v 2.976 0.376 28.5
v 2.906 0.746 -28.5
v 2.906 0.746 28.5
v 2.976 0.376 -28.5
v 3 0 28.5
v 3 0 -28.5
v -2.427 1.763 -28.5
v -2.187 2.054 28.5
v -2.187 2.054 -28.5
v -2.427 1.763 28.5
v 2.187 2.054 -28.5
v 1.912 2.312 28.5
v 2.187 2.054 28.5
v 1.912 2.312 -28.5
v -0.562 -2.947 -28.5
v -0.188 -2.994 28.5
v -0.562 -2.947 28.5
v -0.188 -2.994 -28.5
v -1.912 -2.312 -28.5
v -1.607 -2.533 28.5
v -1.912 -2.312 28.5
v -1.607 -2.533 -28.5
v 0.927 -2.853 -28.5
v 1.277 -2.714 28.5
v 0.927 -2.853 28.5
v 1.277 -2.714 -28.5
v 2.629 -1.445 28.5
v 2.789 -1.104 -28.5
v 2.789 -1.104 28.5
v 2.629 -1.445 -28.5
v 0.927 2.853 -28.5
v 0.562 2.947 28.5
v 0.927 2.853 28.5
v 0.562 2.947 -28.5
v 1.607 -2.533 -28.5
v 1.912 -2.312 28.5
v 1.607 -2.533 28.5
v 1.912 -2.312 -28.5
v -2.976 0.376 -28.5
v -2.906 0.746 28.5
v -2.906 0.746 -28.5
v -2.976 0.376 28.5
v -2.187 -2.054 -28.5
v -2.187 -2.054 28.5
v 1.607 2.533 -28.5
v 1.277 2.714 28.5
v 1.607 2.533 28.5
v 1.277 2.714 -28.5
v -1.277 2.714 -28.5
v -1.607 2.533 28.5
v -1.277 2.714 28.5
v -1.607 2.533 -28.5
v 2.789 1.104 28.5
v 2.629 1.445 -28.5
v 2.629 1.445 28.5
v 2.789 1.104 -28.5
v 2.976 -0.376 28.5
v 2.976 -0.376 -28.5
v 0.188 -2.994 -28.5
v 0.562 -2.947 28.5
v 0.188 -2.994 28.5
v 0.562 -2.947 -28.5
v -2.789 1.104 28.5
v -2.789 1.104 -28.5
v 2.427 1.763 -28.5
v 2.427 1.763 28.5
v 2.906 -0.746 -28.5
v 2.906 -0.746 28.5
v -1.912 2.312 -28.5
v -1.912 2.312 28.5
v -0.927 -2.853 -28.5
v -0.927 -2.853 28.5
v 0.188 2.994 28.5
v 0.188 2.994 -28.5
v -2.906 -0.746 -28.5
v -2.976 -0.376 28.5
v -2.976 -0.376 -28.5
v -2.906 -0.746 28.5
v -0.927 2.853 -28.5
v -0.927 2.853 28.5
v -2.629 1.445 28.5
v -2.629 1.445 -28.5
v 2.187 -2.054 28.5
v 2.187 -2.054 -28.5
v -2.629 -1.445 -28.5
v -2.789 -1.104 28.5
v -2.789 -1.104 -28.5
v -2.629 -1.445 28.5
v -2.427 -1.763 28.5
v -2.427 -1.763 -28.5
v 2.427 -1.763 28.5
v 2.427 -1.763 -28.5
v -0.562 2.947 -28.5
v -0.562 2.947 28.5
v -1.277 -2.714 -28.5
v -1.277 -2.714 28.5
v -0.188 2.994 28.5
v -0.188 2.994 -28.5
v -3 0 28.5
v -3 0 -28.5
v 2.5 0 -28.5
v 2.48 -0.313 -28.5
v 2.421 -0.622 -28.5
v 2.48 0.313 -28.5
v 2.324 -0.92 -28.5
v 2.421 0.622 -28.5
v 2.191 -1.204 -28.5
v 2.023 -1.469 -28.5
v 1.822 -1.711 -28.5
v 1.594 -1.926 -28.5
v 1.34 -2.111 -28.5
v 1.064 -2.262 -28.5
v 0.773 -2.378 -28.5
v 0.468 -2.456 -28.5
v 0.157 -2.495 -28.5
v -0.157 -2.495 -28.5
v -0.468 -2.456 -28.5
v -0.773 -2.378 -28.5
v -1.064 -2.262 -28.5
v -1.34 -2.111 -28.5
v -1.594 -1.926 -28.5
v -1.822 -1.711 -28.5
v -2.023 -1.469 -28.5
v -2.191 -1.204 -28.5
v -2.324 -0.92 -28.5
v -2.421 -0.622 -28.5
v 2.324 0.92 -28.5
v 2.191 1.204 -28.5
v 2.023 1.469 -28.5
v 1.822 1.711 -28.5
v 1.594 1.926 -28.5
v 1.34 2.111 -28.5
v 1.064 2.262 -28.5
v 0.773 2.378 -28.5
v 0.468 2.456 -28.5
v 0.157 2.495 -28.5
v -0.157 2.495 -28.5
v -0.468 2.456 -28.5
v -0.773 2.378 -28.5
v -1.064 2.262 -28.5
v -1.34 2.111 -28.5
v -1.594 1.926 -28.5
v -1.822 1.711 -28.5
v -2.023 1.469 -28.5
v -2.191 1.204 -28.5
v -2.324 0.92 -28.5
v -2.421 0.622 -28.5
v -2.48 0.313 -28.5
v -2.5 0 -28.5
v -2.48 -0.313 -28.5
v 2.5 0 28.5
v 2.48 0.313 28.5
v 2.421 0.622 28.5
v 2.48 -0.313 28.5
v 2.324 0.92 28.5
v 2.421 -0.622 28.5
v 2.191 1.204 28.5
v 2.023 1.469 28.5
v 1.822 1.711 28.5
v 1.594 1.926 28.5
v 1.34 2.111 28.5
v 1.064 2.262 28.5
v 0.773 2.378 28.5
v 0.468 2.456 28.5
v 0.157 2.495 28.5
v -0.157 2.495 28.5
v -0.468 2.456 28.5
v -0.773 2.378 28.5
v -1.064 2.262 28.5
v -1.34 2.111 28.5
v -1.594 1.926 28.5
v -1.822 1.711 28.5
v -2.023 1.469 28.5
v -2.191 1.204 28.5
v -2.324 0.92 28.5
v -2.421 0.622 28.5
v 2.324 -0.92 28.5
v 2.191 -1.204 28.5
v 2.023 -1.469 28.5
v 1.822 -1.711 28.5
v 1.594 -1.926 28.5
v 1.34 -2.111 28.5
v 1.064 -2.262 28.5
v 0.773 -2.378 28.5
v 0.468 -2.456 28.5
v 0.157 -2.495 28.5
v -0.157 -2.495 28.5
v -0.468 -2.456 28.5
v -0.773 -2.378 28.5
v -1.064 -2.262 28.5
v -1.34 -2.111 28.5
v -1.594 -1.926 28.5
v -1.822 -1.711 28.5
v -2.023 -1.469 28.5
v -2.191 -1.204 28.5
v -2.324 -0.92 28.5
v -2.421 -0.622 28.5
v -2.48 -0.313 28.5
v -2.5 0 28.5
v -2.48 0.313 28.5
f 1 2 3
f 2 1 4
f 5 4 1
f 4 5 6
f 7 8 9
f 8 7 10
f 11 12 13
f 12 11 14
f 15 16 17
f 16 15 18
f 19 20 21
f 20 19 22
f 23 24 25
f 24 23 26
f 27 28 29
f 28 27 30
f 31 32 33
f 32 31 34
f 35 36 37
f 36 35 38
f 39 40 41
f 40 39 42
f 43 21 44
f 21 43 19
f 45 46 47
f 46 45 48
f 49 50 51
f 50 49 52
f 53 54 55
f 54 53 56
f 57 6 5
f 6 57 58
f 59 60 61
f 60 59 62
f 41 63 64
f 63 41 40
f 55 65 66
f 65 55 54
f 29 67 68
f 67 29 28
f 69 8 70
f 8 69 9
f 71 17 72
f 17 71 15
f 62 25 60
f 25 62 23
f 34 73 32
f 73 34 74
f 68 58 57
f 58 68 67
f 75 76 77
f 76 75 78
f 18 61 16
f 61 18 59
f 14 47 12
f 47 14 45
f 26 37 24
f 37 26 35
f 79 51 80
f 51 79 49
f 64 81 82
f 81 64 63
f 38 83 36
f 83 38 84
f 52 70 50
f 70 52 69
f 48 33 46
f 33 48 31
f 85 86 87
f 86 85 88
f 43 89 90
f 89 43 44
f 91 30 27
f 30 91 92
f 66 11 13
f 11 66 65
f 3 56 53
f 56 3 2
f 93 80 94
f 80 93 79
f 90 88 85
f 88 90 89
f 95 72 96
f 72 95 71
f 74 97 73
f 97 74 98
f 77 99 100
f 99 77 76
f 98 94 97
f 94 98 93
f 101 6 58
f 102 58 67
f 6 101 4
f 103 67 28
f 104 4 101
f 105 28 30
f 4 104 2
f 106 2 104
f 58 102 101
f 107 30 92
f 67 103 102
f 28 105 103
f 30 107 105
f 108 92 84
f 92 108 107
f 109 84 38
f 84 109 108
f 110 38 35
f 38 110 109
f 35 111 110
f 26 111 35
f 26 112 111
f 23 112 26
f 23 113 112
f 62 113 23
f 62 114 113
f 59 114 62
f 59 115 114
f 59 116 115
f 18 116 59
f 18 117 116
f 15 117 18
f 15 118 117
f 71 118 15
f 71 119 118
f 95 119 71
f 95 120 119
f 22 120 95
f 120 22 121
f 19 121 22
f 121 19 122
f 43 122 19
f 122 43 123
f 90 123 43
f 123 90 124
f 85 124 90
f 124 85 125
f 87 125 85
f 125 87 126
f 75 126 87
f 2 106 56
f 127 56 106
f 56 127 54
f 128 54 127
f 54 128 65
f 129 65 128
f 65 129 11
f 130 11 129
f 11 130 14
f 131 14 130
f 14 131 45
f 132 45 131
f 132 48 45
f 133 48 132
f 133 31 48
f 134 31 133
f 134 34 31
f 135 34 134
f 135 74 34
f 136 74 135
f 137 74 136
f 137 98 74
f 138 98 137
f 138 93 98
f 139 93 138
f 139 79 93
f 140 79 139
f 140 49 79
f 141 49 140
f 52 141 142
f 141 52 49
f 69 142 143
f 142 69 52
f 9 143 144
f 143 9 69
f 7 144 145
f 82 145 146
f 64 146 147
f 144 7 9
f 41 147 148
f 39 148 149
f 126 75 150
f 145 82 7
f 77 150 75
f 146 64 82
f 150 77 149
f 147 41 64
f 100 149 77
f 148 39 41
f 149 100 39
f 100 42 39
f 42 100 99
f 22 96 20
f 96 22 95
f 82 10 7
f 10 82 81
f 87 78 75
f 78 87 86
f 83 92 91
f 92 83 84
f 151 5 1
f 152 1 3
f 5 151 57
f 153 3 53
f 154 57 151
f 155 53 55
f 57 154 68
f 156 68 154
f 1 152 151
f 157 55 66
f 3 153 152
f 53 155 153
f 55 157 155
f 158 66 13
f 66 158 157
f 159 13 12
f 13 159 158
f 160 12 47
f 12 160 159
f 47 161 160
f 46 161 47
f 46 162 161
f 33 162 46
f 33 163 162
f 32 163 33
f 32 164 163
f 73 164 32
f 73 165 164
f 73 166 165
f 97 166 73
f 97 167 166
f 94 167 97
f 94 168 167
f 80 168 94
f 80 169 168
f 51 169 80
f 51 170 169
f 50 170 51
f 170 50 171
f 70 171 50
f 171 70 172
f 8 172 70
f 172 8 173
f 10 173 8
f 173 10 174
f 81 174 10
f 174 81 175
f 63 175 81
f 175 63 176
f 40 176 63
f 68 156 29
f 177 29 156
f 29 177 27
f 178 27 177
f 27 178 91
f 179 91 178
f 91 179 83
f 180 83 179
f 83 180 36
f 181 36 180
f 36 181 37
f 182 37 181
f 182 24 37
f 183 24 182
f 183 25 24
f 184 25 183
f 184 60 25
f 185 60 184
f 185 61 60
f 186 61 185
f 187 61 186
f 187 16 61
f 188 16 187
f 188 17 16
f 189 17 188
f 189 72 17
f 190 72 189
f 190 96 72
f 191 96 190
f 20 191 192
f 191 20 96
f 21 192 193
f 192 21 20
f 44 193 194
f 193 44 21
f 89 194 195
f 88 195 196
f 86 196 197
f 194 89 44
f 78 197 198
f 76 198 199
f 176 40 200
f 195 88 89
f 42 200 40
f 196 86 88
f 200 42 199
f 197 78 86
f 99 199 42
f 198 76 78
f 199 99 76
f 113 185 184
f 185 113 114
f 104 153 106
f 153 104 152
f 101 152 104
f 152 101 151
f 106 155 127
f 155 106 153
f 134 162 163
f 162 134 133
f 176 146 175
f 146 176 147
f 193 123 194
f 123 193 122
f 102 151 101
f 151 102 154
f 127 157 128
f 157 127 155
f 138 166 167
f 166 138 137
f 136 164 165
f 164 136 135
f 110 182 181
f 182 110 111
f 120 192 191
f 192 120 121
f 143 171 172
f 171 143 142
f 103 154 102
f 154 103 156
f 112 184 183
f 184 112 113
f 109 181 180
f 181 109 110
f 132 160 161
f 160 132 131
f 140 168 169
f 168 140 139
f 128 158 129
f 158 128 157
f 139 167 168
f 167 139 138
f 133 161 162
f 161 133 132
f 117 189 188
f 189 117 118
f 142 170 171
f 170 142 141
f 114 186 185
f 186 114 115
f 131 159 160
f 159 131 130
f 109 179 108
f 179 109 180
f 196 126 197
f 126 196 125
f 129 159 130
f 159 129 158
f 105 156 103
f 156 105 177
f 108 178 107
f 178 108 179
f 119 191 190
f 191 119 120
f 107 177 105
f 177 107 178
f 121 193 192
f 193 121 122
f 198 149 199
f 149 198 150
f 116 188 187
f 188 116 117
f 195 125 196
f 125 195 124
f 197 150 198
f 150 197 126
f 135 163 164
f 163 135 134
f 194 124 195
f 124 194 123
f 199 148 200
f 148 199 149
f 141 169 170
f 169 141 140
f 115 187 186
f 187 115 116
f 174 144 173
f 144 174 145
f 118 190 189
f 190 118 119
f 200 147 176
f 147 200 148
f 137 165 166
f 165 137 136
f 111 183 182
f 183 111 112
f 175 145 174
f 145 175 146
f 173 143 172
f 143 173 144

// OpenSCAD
$fn = 50;


difference() {
	union() {
		translate(v = [0, 0, -28.5000000000]) {
			cylinder(h = 57, r = 3.0000000000);
		}
	}
	union() {
		translate(v = [0, 0, -100.0000000000]) {
			cylinder(h = 200, r = 2.5000000000);
		}
	}
}
